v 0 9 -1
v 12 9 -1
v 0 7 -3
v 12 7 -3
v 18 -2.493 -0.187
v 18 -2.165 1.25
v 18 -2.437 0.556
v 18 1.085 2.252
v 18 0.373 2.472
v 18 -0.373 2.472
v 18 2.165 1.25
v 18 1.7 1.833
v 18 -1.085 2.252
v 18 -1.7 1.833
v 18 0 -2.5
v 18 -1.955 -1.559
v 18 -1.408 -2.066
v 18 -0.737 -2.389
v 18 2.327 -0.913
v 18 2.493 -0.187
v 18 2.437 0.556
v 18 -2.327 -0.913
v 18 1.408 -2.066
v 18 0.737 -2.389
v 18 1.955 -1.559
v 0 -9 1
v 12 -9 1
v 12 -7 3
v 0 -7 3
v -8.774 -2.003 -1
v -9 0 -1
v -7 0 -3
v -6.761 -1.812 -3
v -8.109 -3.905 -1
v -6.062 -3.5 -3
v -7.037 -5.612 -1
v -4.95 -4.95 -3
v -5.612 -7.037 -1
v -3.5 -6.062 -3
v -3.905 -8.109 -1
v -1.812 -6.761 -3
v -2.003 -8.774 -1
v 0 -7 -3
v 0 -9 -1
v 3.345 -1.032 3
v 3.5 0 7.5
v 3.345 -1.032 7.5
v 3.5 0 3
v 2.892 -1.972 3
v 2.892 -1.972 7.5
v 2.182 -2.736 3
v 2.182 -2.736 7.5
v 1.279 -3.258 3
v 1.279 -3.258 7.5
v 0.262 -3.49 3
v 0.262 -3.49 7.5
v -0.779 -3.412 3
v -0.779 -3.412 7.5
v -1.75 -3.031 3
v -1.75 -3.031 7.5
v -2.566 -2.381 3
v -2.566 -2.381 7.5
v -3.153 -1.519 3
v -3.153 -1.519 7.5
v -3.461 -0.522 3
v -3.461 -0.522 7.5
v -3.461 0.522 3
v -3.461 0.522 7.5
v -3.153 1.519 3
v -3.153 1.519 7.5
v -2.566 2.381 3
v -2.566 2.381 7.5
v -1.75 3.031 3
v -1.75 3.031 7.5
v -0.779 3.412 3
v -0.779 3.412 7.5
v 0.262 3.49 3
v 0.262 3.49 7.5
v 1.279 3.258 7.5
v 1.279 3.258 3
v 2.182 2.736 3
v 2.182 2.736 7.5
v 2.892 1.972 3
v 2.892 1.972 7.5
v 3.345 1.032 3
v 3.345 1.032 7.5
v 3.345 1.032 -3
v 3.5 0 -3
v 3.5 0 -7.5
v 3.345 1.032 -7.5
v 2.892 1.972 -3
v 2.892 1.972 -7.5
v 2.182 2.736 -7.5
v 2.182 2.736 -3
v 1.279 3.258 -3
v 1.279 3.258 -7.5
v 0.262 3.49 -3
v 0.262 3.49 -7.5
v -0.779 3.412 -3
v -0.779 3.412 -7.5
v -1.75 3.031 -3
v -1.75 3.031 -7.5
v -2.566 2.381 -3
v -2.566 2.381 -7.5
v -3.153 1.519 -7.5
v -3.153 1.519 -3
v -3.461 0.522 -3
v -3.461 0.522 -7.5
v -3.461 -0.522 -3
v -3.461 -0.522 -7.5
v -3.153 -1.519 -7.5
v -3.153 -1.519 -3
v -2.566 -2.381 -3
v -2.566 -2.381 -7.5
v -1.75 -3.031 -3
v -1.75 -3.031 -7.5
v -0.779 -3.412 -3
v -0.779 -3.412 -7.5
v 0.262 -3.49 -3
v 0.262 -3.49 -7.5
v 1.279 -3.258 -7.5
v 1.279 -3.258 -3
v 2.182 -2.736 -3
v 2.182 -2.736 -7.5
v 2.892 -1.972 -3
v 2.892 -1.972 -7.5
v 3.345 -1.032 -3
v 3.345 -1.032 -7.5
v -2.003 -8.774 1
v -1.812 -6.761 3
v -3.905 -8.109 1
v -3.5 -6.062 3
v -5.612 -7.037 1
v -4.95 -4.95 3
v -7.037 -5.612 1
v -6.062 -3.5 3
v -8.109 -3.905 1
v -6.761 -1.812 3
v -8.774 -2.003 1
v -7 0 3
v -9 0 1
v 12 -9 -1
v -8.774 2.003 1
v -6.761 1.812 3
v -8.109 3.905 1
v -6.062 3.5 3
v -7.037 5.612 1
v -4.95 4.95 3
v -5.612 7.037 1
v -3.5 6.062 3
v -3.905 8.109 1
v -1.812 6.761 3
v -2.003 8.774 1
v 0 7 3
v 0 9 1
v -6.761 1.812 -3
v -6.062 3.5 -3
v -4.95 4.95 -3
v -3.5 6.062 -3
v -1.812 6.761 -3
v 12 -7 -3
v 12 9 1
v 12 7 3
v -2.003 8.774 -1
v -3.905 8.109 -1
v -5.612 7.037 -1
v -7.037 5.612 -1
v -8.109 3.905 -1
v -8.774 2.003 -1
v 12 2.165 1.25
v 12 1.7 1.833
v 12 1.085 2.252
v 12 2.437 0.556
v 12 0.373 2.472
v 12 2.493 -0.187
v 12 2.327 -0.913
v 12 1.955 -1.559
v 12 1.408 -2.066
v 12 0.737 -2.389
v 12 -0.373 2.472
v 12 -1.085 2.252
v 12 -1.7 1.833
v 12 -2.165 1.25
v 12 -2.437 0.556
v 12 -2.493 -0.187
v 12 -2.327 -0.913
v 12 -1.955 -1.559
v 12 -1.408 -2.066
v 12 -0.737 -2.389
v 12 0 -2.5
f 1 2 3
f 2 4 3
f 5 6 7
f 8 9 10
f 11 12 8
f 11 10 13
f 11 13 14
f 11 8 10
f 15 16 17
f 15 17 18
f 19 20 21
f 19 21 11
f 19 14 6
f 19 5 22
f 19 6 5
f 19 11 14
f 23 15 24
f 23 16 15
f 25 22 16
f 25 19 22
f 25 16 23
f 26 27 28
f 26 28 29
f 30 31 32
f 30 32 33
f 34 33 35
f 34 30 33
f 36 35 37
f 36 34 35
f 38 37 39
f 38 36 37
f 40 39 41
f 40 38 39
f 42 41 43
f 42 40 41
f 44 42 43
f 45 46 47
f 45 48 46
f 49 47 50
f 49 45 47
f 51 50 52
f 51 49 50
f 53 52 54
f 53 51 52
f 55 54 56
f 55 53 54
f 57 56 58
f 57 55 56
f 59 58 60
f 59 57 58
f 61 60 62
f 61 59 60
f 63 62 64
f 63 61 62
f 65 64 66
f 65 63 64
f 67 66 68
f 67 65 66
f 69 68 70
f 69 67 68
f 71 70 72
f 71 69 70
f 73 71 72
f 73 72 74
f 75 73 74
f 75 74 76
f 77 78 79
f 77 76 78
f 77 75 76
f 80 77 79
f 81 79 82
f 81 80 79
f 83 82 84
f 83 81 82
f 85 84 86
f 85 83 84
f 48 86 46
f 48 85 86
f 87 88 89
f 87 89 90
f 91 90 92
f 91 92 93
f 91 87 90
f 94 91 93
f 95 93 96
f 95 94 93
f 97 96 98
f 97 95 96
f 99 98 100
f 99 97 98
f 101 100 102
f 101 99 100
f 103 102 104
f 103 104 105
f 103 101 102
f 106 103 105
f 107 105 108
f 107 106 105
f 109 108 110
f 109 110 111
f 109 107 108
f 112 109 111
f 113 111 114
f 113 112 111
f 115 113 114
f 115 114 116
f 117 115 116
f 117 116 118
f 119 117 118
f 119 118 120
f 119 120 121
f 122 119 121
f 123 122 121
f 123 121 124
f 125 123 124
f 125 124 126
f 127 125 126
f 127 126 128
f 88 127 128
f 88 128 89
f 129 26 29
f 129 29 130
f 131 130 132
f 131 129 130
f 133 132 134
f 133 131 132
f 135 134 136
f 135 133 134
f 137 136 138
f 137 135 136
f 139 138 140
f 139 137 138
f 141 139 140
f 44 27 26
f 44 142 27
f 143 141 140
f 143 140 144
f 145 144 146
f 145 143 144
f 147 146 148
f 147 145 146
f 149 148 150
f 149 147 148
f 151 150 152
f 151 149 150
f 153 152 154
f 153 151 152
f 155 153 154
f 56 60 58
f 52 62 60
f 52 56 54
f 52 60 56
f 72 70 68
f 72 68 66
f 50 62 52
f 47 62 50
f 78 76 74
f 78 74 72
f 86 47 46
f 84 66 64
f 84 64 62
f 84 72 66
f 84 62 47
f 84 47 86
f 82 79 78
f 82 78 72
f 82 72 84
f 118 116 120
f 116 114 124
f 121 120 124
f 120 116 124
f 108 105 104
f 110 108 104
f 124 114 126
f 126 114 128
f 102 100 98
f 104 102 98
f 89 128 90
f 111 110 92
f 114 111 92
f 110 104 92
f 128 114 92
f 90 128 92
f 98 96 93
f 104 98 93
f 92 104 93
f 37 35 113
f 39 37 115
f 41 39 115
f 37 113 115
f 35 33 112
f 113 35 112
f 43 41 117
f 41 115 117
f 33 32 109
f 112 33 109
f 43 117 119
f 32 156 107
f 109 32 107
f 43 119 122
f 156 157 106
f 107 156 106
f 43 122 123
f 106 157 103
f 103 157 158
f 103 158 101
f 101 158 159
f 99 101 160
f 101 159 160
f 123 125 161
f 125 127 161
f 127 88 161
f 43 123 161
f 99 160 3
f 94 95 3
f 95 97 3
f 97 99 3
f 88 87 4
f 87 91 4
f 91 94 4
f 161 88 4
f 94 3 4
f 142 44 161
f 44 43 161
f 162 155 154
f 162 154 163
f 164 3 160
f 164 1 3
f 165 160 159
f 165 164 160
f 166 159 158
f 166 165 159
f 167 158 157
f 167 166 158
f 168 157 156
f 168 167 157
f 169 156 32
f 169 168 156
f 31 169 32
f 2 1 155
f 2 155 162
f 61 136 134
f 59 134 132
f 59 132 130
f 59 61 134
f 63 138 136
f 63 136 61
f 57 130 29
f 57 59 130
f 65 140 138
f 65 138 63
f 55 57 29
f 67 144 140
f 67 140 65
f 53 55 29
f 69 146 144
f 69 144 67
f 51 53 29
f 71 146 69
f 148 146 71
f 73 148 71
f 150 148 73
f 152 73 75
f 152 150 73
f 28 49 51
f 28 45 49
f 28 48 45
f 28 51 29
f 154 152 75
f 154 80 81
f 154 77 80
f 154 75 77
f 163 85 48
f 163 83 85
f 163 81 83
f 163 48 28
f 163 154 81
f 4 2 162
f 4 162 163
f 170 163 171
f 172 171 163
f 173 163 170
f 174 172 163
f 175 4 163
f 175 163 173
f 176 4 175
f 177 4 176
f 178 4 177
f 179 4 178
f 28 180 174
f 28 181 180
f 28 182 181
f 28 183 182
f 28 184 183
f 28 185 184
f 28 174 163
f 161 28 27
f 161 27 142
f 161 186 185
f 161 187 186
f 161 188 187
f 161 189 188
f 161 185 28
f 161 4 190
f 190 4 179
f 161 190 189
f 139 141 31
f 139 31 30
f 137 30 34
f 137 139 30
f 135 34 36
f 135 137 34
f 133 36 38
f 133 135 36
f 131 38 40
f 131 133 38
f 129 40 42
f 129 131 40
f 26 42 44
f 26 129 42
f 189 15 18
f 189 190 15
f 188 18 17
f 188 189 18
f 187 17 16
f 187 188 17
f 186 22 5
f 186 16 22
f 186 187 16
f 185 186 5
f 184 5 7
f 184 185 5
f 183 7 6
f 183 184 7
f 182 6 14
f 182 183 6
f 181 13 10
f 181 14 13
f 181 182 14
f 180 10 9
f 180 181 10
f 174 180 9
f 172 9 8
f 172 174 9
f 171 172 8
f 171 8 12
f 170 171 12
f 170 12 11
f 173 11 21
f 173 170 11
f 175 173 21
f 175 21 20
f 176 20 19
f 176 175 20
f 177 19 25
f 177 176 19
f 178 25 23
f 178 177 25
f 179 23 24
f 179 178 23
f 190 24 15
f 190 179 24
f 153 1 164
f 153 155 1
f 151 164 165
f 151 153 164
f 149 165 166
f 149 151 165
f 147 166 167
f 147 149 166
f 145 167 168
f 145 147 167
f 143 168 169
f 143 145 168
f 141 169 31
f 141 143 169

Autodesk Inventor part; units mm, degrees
ref_plane "YZ Plane" through (0, 0, 0) normal (1, 0, 0) x (0, 1, 0)
ref_plane "XZ Plane" through (0, 0, 0) normal (0, 1, 0) x (-1, 0, 0)
ref_plane "XY Plane" through (0, 0, 0) normal (0, 0, 1) x (1, 0, 0)
sketch "스케치1" plane through (0, 0, 0) normal (0, 0, 1) x (1, 0, 0)
  circle A0 centre (0, 0) radius 3.5
  line L0 (-9, 9) -> (12, 9)
  line L1 (12, 9) -> (12, -9)
  line L2 (12, -9) -> (-9, -9)
  line L3 (-9, -9) -> (-9, 9)
  dimension "d0" = 7
  dimension "d1" = 21
  dimension "d2" = 18
  dimension "d3" = 12
  dimension "d4" = 9
extrude "돌출1" add sketch "스케치1" along normal mid plane 6
extrude "돌출2" add sketch "스케치1" along normal mid plane 15 contours A0
fillet "모깎기1" radius 9 2 edges at (-9, 9, 0) (-9, -9, 0)
chamfer "모따기1" distance 2 angle 45 6 edges at (-6.3641, 6.3641, 3) (5.9998, 9, 3) (5.9998, -9, 3) (-6.3641, 6.3641, -3) (5.9998, -9, -3) (5.9998, 9, -3)
sketch "스케치2" plane through (12, -7, 3) normal (1, 0, 0) x (0, 0, -1)
  circle A0 centre (3, 7) radius 2.5
  dimension "d13" = 5
extrude "돌출3" add sketch "스케치2" along normal blind 6
properties part number "2번부품"
